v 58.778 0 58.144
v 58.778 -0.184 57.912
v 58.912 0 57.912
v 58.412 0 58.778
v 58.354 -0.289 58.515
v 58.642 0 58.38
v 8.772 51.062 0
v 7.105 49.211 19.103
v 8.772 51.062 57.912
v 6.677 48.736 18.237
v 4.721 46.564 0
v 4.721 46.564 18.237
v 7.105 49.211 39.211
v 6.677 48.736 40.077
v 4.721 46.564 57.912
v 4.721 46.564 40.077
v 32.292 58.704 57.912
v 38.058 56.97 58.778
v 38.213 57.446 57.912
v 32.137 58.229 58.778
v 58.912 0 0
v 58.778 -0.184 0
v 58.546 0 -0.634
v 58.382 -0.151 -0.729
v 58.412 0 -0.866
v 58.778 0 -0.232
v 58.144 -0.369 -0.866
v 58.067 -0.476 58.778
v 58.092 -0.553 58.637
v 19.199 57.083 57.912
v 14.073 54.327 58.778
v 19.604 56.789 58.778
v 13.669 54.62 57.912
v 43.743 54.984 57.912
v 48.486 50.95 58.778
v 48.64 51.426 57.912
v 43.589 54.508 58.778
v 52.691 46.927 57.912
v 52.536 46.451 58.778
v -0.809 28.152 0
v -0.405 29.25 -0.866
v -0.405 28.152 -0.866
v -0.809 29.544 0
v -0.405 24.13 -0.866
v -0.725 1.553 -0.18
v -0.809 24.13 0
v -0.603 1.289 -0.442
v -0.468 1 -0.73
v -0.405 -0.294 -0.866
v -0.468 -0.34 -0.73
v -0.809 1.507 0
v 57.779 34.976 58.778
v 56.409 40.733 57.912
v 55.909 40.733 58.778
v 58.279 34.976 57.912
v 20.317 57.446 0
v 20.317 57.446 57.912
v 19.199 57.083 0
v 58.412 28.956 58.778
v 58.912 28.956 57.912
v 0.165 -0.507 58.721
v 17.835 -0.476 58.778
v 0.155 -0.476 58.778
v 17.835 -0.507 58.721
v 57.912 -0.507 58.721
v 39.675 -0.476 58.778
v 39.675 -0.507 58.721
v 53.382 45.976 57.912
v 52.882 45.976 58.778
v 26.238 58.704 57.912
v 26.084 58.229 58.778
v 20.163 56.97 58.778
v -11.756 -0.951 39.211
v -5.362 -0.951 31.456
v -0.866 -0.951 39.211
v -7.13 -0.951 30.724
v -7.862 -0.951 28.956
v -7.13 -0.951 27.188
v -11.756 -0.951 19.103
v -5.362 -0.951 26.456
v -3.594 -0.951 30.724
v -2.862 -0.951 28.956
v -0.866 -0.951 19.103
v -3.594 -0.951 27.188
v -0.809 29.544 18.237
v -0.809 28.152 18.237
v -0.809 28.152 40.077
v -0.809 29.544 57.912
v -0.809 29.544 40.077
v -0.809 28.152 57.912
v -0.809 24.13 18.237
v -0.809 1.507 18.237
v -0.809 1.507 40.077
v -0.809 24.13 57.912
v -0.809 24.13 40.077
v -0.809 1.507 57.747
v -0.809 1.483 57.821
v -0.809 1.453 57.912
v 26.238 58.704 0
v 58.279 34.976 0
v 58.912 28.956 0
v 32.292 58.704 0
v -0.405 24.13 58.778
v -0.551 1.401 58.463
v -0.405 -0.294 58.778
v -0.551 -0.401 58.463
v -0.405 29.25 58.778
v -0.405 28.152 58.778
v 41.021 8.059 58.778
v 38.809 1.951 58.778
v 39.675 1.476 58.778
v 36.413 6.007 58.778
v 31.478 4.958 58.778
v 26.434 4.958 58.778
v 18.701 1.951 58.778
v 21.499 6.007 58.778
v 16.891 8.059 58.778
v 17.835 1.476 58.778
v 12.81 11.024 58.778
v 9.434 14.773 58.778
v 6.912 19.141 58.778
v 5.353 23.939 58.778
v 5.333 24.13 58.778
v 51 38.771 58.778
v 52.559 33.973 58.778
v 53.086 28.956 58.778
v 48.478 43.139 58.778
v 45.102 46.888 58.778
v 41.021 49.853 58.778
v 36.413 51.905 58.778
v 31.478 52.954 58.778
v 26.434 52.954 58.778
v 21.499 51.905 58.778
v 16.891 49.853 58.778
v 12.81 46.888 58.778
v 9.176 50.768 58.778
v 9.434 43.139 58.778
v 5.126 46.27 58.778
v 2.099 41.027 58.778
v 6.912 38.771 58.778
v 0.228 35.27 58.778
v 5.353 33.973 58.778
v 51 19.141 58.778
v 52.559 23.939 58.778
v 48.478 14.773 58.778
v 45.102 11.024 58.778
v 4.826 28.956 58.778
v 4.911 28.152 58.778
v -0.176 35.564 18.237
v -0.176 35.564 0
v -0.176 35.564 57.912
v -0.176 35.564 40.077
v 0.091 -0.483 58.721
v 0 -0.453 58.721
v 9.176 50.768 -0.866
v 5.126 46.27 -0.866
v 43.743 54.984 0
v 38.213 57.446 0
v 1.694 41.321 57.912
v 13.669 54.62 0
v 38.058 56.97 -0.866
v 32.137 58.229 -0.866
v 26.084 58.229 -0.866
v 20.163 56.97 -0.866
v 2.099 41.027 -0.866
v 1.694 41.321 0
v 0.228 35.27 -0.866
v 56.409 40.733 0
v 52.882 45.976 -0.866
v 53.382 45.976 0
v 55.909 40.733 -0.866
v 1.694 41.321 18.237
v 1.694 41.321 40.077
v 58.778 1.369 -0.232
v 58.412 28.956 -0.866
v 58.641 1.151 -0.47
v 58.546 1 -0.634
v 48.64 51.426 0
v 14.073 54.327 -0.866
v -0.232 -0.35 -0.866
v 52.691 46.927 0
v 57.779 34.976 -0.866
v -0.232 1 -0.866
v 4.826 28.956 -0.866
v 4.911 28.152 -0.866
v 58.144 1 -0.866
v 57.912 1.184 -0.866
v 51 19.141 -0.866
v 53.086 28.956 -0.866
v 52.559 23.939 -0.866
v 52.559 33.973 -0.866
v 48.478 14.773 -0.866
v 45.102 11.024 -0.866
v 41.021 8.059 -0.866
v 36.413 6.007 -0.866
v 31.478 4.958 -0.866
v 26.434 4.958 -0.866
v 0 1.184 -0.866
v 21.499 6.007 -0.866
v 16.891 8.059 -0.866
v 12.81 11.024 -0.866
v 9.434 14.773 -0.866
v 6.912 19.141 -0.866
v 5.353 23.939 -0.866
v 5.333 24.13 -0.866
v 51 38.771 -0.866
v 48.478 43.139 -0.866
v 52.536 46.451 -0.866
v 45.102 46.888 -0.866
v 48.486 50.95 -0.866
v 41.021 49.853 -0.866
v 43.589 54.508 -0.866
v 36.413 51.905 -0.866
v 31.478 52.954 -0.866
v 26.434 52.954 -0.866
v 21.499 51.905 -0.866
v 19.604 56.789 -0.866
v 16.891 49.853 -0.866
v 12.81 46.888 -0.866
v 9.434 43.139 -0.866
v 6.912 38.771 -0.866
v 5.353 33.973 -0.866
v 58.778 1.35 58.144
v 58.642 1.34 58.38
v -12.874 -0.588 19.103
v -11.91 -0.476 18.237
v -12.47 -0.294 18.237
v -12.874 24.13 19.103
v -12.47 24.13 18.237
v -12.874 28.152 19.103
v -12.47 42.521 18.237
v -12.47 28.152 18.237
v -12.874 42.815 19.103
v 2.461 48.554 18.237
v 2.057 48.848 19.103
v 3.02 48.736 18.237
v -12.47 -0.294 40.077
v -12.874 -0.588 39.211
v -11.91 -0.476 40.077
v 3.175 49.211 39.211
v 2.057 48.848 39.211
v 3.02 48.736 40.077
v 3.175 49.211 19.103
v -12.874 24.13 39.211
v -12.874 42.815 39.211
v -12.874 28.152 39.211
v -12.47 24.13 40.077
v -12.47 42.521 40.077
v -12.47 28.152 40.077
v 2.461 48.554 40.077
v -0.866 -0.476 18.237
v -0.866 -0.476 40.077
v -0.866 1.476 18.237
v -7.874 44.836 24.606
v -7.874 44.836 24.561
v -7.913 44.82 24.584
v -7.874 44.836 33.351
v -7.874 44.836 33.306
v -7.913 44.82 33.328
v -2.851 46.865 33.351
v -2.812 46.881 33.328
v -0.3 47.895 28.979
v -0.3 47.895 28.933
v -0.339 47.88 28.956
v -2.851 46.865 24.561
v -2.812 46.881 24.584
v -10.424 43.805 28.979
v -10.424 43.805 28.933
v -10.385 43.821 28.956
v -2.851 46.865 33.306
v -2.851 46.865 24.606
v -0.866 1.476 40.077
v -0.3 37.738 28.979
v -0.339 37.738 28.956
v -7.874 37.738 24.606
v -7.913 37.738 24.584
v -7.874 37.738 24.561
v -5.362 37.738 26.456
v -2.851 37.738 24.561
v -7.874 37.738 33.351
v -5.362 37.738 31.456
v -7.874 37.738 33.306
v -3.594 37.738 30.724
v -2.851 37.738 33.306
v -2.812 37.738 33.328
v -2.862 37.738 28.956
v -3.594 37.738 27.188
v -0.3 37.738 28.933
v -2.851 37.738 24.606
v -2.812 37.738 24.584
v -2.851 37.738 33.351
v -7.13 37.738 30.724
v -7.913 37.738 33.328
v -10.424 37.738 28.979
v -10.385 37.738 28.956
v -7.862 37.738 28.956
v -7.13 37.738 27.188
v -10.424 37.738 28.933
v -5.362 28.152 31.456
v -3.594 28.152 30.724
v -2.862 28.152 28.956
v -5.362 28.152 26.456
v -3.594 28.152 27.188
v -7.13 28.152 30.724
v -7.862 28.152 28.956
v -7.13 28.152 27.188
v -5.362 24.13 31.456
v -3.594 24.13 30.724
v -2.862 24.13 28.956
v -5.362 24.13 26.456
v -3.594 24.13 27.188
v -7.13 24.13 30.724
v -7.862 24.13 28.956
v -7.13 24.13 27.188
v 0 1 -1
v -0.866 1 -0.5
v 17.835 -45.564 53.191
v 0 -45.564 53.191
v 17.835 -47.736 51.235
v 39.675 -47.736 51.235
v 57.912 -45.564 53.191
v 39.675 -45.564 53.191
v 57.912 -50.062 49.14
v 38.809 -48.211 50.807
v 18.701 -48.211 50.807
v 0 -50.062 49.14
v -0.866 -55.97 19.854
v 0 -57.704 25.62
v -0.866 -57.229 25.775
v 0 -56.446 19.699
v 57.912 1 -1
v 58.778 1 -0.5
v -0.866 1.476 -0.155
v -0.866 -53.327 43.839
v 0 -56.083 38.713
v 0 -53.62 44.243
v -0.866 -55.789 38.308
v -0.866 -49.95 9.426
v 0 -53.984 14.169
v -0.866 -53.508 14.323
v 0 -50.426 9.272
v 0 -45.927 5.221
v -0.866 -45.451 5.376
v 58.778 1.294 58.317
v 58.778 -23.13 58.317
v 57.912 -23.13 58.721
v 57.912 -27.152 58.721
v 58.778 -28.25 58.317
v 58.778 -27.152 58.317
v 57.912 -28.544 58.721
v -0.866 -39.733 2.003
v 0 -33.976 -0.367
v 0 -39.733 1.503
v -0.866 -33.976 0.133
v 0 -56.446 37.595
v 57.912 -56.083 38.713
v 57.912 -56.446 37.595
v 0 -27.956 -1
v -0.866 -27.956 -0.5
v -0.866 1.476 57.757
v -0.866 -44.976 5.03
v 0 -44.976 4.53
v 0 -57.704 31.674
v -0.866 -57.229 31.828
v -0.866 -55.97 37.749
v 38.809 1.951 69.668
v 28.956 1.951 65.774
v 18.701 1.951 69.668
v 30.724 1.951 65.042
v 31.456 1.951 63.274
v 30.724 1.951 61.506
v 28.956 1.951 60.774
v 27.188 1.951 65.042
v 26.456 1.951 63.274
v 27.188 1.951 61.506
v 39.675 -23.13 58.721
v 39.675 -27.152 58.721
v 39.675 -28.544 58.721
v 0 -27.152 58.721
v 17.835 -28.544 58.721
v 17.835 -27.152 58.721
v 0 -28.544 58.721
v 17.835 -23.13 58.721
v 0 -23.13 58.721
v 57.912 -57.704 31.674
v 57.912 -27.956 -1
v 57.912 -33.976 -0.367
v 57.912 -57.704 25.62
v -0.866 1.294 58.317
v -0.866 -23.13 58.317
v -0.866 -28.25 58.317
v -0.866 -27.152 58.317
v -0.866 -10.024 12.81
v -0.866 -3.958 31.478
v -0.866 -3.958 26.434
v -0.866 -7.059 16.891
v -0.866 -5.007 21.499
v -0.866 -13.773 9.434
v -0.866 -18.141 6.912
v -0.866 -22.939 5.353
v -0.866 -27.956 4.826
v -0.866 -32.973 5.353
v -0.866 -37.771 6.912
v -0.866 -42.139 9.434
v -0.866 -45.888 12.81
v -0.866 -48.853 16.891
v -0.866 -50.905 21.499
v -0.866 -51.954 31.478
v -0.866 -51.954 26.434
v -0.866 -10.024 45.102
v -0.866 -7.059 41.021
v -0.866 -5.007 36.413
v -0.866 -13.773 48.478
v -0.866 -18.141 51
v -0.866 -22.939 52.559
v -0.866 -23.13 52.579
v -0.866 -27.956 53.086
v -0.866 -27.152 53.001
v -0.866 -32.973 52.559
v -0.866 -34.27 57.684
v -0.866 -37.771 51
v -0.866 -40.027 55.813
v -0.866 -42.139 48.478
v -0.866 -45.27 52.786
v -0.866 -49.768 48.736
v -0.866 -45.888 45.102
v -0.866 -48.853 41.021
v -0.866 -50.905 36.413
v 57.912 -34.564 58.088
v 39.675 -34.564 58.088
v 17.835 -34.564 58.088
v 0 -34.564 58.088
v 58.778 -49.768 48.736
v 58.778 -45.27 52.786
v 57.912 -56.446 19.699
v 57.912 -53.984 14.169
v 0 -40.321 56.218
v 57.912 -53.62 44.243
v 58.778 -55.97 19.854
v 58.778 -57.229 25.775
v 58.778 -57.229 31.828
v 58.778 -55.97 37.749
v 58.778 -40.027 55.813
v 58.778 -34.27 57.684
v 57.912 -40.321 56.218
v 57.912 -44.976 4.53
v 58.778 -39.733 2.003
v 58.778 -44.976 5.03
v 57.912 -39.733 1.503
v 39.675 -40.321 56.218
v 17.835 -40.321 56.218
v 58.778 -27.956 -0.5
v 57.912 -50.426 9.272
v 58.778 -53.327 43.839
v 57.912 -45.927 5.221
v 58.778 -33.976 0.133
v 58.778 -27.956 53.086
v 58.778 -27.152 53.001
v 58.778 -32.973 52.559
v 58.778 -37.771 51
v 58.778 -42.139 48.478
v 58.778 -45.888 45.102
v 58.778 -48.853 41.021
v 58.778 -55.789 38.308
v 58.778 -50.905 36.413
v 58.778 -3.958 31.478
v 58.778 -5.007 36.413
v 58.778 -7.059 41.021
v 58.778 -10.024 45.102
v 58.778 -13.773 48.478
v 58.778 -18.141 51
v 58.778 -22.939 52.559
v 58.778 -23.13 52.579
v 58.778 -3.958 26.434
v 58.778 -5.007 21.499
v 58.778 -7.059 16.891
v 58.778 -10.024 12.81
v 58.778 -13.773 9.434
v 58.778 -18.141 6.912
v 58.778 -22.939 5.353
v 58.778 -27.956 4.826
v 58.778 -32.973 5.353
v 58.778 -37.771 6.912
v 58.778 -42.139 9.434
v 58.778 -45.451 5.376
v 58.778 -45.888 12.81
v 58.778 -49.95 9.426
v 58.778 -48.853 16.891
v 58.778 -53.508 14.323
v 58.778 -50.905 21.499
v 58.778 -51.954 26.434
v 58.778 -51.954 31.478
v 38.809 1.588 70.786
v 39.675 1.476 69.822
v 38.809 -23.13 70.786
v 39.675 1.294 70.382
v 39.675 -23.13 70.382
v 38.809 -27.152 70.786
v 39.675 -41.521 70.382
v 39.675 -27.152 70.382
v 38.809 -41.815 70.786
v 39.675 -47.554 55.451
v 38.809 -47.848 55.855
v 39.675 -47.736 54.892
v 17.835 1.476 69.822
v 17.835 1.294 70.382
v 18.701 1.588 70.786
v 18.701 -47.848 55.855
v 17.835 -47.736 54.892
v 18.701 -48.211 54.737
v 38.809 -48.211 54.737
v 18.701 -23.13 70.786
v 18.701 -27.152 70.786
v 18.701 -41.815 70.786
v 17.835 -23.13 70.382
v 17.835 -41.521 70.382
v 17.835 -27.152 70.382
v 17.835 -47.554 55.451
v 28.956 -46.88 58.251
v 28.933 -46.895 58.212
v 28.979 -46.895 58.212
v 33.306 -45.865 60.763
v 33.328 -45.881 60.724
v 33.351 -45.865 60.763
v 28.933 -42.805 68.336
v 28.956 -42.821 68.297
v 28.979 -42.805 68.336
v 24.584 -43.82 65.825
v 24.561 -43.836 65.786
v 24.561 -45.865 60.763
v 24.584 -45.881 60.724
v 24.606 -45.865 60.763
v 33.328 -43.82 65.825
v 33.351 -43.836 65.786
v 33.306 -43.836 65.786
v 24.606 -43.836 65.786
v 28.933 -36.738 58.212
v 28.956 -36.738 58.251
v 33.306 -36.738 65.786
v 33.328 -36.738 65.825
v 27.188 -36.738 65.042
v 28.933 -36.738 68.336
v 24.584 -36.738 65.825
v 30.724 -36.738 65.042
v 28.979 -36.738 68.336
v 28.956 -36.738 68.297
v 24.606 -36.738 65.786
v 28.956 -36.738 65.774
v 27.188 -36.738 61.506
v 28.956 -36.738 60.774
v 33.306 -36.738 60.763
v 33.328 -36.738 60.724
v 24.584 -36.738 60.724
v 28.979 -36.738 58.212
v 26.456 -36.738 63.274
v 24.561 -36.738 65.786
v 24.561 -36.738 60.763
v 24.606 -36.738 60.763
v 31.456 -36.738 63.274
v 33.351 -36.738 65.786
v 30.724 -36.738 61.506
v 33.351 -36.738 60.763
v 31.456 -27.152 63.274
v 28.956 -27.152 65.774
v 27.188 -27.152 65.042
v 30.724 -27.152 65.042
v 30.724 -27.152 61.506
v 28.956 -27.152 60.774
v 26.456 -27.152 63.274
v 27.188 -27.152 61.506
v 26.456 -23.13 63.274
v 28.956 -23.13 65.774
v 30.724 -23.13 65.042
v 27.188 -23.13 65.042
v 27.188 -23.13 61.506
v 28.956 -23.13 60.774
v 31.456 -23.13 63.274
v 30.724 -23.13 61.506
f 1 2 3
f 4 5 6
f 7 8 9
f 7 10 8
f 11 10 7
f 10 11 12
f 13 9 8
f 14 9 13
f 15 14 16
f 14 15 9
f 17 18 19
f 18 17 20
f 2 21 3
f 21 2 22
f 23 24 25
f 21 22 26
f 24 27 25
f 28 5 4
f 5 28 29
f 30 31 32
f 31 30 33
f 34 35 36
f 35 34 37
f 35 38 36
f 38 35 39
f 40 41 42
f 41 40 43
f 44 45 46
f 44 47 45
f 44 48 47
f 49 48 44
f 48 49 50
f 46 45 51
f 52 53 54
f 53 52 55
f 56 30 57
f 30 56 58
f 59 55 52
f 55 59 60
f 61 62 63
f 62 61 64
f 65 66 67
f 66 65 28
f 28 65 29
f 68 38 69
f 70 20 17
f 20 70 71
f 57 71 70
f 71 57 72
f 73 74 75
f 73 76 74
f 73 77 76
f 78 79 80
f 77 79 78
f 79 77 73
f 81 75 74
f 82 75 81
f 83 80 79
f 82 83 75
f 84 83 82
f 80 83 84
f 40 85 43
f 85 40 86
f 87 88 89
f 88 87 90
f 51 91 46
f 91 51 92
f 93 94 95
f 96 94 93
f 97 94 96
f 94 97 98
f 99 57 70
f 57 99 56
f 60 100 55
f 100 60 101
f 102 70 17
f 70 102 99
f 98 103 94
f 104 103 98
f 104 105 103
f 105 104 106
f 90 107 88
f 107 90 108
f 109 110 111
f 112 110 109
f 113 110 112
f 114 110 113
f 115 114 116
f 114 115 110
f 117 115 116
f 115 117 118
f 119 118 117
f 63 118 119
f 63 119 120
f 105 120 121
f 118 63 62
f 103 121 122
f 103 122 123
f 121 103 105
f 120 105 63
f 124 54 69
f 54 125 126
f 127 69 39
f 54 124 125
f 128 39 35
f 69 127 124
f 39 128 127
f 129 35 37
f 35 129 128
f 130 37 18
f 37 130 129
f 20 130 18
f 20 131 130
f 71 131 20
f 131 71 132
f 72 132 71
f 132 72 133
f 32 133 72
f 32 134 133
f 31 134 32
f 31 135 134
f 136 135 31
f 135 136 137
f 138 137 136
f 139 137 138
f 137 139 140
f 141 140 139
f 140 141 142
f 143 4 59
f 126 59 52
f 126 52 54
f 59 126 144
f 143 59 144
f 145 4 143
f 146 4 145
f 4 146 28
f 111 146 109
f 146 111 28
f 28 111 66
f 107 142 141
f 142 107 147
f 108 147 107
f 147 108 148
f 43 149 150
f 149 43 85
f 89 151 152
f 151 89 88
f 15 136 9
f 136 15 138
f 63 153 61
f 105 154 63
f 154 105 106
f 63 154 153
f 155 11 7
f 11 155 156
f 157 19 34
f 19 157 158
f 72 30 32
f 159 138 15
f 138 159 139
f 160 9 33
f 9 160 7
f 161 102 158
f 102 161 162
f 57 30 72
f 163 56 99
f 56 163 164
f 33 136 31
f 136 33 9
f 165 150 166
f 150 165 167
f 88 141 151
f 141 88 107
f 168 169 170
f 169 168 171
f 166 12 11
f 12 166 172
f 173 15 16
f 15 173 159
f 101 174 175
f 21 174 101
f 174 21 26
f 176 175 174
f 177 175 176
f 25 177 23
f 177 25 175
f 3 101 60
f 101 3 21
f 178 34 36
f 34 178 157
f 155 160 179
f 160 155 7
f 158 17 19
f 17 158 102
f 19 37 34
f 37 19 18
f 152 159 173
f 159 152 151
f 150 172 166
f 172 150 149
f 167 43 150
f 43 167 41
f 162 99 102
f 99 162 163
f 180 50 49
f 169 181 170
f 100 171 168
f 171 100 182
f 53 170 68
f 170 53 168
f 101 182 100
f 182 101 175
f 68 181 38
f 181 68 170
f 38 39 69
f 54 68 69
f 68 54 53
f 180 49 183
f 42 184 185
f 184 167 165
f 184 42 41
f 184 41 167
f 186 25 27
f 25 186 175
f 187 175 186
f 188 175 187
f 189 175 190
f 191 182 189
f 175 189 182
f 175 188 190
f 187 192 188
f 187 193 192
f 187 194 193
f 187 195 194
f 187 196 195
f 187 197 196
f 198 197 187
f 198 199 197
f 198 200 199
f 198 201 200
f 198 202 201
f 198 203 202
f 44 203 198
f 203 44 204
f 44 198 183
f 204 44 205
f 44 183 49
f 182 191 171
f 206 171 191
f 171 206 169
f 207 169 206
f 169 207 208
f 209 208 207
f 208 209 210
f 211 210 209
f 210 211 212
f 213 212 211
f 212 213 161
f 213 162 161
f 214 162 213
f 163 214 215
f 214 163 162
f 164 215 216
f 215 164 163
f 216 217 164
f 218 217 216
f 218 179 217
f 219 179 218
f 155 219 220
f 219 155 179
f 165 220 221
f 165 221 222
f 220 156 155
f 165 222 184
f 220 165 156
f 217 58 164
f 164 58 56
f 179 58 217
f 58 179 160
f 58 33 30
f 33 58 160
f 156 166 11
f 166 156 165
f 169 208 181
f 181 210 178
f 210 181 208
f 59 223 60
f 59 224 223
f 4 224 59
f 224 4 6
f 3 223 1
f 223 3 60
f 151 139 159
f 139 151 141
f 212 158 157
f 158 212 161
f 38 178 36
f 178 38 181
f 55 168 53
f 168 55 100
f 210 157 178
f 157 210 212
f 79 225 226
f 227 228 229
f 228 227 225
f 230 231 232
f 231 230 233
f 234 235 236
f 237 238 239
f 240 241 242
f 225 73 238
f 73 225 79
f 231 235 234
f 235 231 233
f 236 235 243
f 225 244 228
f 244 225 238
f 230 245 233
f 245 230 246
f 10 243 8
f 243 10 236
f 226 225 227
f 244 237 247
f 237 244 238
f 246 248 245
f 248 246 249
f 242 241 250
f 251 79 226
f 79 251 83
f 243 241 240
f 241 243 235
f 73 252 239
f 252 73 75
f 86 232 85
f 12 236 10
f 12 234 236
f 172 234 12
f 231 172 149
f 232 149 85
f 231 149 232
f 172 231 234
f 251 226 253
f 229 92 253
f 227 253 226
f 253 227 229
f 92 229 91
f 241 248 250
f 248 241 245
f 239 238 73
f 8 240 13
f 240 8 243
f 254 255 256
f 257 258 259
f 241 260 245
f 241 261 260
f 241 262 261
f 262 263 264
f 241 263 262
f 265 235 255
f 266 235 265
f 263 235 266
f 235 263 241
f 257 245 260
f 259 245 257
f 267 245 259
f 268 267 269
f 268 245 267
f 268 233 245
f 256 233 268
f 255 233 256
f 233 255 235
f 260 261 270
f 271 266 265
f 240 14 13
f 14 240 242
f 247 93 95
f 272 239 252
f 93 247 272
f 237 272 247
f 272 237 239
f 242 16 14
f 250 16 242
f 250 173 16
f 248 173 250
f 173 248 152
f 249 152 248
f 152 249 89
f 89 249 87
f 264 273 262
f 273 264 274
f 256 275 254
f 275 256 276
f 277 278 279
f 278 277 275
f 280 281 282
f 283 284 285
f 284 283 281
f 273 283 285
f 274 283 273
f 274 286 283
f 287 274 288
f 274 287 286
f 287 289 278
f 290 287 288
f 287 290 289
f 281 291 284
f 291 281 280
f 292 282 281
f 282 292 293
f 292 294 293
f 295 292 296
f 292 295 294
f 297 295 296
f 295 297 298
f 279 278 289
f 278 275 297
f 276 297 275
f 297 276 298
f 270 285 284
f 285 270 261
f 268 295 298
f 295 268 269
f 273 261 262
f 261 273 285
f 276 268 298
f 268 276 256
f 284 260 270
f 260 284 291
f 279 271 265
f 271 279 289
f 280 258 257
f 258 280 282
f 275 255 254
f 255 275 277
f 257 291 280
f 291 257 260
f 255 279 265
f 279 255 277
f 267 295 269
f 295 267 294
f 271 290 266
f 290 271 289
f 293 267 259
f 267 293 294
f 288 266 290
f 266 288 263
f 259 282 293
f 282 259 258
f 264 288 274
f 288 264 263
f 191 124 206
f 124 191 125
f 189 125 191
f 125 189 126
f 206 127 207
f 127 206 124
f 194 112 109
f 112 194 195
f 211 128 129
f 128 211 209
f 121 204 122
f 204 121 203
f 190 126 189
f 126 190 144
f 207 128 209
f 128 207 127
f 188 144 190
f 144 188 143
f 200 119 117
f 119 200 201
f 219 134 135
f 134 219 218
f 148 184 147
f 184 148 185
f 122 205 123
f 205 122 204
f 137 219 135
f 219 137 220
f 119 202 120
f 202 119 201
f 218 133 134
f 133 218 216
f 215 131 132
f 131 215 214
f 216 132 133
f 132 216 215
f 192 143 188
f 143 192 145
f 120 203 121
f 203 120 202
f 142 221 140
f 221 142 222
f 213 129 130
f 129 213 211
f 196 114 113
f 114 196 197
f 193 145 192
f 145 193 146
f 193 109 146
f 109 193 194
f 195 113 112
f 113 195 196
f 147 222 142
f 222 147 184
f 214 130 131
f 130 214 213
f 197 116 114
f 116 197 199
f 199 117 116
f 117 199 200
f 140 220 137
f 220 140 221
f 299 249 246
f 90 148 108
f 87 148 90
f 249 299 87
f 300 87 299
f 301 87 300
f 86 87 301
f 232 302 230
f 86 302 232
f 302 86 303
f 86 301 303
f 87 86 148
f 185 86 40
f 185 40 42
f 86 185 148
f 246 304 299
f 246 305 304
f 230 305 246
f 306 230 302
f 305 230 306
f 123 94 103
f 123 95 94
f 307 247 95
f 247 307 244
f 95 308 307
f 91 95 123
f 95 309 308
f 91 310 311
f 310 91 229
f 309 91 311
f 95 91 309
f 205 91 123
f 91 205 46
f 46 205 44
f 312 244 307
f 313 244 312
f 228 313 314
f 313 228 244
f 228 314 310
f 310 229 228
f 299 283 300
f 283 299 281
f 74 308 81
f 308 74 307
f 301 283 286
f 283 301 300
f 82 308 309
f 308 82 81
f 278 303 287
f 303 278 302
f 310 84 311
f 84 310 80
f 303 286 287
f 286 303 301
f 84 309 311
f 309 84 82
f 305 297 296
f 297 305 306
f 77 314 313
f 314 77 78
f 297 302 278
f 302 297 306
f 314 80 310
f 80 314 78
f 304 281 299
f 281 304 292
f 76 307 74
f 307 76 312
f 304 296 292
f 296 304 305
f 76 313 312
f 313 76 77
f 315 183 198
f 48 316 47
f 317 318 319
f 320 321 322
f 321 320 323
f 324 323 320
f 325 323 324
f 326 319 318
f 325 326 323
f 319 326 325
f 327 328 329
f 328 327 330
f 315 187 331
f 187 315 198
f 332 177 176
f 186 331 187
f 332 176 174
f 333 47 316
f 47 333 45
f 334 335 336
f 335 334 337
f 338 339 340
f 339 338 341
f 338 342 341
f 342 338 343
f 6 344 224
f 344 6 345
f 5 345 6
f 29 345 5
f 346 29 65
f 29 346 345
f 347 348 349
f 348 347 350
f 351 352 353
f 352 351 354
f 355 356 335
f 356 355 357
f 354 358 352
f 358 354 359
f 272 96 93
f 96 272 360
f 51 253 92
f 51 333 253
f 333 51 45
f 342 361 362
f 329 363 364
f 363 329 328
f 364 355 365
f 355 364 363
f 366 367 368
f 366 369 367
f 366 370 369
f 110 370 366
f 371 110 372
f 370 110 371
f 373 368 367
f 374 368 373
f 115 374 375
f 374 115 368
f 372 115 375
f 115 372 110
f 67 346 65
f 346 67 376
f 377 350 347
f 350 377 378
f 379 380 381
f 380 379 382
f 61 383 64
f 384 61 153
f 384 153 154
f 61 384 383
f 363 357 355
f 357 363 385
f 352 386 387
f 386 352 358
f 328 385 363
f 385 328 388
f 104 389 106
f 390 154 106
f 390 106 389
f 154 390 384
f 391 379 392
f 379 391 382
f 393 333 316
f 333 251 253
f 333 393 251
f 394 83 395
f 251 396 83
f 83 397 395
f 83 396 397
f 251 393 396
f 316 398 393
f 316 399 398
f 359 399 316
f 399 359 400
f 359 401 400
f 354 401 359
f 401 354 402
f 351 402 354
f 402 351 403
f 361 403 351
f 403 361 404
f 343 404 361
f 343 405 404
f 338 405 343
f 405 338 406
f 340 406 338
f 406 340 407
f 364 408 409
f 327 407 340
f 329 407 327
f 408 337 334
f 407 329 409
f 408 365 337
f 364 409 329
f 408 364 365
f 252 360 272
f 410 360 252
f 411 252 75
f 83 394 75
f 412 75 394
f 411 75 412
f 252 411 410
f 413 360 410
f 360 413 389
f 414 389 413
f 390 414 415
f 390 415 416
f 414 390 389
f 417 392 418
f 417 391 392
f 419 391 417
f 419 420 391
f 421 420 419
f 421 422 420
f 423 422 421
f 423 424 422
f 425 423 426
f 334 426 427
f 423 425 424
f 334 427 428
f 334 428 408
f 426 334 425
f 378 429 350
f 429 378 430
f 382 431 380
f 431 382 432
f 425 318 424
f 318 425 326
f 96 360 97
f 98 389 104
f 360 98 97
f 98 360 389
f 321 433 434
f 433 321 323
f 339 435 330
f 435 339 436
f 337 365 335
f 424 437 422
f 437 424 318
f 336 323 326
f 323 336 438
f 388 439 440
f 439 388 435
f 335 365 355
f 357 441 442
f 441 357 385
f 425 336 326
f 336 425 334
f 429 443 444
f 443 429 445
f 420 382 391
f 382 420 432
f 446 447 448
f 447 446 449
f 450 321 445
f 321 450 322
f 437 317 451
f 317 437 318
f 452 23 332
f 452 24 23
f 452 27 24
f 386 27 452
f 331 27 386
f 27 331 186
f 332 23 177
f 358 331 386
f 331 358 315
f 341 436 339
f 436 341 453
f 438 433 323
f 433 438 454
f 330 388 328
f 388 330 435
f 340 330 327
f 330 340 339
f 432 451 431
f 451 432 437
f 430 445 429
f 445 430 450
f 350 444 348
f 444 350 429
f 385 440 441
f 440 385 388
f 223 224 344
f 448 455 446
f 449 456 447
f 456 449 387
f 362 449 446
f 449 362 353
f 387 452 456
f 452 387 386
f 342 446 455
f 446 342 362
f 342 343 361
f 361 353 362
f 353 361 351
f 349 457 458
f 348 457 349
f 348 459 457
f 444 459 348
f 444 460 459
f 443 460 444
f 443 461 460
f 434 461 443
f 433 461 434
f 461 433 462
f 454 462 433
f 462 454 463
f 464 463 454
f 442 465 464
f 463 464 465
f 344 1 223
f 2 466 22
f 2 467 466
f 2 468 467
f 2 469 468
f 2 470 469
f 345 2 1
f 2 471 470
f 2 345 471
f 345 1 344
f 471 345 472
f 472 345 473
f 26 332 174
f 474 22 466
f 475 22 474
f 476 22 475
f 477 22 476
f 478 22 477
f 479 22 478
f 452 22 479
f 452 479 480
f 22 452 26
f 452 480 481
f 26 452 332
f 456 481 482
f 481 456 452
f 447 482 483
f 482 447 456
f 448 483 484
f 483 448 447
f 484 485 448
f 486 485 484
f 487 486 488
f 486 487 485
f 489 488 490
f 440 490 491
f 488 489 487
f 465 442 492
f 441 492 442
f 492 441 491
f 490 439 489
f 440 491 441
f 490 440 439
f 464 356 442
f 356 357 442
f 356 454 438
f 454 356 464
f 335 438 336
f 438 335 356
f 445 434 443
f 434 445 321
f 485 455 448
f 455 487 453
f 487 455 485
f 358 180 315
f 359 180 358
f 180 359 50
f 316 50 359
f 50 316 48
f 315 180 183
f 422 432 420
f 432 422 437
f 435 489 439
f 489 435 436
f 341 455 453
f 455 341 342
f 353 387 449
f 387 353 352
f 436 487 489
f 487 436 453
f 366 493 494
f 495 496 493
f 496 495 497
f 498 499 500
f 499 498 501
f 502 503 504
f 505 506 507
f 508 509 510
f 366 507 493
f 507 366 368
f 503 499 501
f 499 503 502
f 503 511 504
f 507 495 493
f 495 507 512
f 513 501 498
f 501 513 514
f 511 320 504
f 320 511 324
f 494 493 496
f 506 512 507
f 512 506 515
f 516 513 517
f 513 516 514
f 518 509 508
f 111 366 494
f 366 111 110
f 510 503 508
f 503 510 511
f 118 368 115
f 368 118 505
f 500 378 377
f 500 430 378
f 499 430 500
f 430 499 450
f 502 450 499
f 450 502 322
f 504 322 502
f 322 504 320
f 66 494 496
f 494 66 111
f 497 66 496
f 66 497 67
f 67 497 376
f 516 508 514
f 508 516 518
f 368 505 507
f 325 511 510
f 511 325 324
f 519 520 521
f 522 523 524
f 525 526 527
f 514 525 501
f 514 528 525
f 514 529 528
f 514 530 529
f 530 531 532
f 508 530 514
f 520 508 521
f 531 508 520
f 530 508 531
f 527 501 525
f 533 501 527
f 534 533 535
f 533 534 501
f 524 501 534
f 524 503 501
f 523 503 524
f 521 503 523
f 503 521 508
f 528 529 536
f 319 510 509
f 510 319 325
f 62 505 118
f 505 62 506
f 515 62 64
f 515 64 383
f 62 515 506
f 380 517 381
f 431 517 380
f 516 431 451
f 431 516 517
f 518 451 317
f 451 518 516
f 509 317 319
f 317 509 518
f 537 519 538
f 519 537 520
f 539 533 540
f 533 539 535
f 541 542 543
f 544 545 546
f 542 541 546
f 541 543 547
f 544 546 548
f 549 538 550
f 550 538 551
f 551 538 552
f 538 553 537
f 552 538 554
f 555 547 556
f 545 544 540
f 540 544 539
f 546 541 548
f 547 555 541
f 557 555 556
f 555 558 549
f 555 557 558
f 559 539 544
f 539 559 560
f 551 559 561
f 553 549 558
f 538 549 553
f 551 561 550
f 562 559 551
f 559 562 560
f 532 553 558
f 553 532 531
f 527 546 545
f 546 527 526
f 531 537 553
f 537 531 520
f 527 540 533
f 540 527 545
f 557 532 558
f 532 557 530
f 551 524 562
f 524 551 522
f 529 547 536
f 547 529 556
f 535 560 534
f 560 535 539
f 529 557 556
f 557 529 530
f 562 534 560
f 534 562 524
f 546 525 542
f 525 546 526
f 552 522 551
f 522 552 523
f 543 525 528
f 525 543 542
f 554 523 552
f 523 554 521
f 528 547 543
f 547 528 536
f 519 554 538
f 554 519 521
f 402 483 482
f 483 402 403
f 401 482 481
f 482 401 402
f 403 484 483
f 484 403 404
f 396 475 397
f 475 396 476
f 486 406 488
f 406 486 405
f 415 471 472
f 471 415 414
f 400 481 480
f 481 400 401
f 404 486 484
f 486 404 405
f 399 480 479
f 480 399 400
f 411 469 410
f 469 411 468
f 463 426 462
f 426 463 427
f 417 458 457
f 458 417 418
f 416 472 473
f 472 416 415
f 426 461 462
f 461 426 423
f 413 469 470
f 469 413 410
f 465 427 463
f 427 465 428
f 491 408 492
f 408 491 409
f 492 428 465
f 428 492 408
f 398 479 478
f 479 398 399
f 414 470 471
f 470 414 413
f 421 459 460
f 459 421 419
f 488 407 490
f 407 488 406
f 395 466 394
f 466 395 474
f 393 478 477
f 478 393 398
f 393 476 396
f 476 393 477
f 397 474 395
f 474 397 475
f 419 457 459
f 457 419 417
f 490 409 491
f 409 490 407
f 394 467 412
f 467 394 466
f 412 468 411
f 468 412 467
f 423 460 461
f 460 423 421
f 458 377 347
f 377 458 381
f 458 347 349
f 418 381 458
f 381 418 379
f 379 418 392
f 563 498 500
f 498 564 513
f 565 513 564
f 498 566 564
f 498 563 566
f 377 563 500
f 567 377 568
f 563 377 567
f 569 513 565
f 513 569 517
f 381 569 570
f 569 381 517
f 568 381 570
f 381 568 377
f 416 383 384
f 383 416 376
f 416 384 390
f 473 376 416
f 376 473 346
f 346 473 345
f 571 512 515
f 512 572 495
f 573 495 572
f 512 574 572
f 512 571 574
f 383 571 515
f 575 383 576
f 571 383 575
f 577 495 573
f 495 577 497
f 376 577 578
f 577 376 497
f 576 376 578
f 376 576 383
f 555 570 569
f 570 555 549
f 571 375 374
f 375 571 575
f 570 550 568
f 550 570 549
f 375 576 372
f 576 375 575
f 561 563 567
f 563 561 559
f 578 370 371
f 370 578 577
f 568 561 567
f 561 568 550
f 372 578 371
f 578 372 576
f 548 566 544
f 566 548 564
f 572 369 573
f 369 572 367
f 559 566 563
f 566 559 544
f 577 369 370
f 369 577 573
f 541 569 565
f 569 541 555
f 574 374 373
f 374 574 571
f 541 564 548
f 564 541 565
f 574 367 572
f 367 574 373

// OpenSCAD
//M. Haris Usmani
//http://harisusmani.com

//All Units are in mm, Import as STL with Unit=mm

R=1.9; //Radius of Pipe in Inches [2.375,1.9,1.660,1.315]
R_mm=R*25.4; //Converted to mm!
S=1.2; //Determines Strength of Clamp in Percentage-FIXED!
T=3; //Space for Tightening [0:5]
M=5; //Nut Type M[4,5,6]

/////////////////////////////////////////////////////////////////////////////
//Hexagonal Module from shapes.scad, http://svn.clifford.at/openscad/trunk/libraries/shapes.scad by Catarina Mota
module hexagon(size, height) {
  boxWidth = size/1.75;
  for (r = [-60, 0, 60]) rotate([0,0,r]) cube([boxWidth, size, height], true);
}
/////////////////////////////////////////////////////////////////////////////

//Pipe Model for Visualization
//translate([R_mm*S/2,R_mm*S/2,-R_mm*6]) cylinder(R_mm*10,R_mm/2,R_mm/2);

union()//Main Duplication
{

difference() //Pipe Hole
{
union()
{
minkowski() //Fillet
{
	union()
	{
		cube([R_mm*S,R_mm/2*S, R_mm*S]); //Main Body
		translate([R_mm*S/2,R_mm*S/2,0]) cylinder(R_mm*S,R_mm*S/2,R_mm*S/2); //Curved Edge
	}
	sphere([R_mm/2,R_mm,R_mm*5/12]); //Fillet Object
}

minkowski() //Fillet
{
	difference() //Hard Chamfer
	{
		translate([-R_mm/4,0,(R_mm/2)-(R_mm*5/48)]) cube([R_mm/2,R_mm,R_mm*5/12]);
		translate([-R_mm/4,R_mm*7/8,(R_mm/2)-(R_mm*5/24)]) rotate([0,0,22]) cube([R_mm/2,R_mm,2*R_mm*5/12]);
	}
	sphere([R_mm/2,R_mm,R_mm*5/12]); //Fillet Object
}
}
	union()
	{
		translate([R_mm*S/2,R_mm*S/2,-R_mm*6]) cylinder(R_mm*10,R_mm/2,R_mm/2);//Pipe
		translate([-R_mm,R_mm*S*5/12,-R_mm]) cube([R_mm*2,R_mm/(15-T),R_mm*4]);//Tightning Space
		translate([-R_mm/9,R_mm*2,(R_mm*S/2)]) rotate([90,0,0]) cylinder((R_mm*4),M/2,M/2); //Screw Space
		if (M==4) translate([-R_mm/9,R_mm*1.3,(R_mm*S/2)]) rotate([90,0,0]) hexagon(7.66,50); //NUTS
		if (M==5) translate([-R_mm/9,R_mm*1.3,(R_mm*S/2)]) rotate([90,0,0]) hexagon(8.79,50);
		if (M==6) translate([-R_mm/9,R_mm*1.3,(R_mm*S/2)]) rotate([90,0,0]) hexagon(11.05,50);
	}
} //Single Side ENDS

}

{

translate([R_mm*S,1,R_mm*S]) rotate([180,90,0]) //Main Translation

difference() //Pipe Hole
{
union()
{
minkowski() //Fillet
{
	union()
	{
		cube([R_mm*S,R_mm/2*S, R_mm*S]); //Main Body
		translate([R_mm*S/2,R_mm*S/2,0]) cylinder(R_mm*S,R_mm*S/2,R_mm*S/2); //Curved Edge
	}
	sphere([R_mm/2,R_mm,R_mm*5/12]); //Fillet Object
}

minkowski() //Fillet
{
	difference() //Hard Chamfer
	{
		translate([-R_mm/4,0,(R_mm/2)-(R_mm*5/48)]) cube([R_mm/2,R_mm,R_mm*5/12]);
		translate([-R_mm/4,R_mm*7/8,(R_mm/2)-(R_mm*5/24)]) rotate([0,0,22]) cube([R_mm/2,R_mm,2*R_mm*5/12]);
	}
	sphere([R_mm/2,R_mm,R_mm*5/12]); //Fillet Object
}
}
	union()
	{
		translate([R_mm*S/2,R_mm*S/2,-R_mm*6]) cylinder(R_mm*10,R_mm/2,R_mm/2);//Pipe
		translate([-R_mm,R_mm*S*5/12,-R_mm]) cube([R_mm*2,R_mm/(15-T),R_mm*4]);//Tightning Space
		translate([-R_mm/9,R_mm*2,(R_mm*S/2)]) rotate([90,0,0]) cylinder((R_mm*4),M/2,M/2); //Screw Space
		if (M==4) translate([-R_mm/9,R_mm*1.3,(R_mm*S/2)]) rotate([90,0,0]) hexagon(7.66,50); //NUTS
		if (M==5) translate([-R_mm/9,R_mm*1.3,(R_mm*S/2)]) rotate([90,0,0]) hexagon(8.79,50);
		if (M==6) translate([-R_mm/9,R_mm*1.3,(R_mm*S/2)]) rotate([90,0,0]) hexagon(11.05,50);
	}
}

}

smooth=360;


// preview[view: south, tilt: top]
